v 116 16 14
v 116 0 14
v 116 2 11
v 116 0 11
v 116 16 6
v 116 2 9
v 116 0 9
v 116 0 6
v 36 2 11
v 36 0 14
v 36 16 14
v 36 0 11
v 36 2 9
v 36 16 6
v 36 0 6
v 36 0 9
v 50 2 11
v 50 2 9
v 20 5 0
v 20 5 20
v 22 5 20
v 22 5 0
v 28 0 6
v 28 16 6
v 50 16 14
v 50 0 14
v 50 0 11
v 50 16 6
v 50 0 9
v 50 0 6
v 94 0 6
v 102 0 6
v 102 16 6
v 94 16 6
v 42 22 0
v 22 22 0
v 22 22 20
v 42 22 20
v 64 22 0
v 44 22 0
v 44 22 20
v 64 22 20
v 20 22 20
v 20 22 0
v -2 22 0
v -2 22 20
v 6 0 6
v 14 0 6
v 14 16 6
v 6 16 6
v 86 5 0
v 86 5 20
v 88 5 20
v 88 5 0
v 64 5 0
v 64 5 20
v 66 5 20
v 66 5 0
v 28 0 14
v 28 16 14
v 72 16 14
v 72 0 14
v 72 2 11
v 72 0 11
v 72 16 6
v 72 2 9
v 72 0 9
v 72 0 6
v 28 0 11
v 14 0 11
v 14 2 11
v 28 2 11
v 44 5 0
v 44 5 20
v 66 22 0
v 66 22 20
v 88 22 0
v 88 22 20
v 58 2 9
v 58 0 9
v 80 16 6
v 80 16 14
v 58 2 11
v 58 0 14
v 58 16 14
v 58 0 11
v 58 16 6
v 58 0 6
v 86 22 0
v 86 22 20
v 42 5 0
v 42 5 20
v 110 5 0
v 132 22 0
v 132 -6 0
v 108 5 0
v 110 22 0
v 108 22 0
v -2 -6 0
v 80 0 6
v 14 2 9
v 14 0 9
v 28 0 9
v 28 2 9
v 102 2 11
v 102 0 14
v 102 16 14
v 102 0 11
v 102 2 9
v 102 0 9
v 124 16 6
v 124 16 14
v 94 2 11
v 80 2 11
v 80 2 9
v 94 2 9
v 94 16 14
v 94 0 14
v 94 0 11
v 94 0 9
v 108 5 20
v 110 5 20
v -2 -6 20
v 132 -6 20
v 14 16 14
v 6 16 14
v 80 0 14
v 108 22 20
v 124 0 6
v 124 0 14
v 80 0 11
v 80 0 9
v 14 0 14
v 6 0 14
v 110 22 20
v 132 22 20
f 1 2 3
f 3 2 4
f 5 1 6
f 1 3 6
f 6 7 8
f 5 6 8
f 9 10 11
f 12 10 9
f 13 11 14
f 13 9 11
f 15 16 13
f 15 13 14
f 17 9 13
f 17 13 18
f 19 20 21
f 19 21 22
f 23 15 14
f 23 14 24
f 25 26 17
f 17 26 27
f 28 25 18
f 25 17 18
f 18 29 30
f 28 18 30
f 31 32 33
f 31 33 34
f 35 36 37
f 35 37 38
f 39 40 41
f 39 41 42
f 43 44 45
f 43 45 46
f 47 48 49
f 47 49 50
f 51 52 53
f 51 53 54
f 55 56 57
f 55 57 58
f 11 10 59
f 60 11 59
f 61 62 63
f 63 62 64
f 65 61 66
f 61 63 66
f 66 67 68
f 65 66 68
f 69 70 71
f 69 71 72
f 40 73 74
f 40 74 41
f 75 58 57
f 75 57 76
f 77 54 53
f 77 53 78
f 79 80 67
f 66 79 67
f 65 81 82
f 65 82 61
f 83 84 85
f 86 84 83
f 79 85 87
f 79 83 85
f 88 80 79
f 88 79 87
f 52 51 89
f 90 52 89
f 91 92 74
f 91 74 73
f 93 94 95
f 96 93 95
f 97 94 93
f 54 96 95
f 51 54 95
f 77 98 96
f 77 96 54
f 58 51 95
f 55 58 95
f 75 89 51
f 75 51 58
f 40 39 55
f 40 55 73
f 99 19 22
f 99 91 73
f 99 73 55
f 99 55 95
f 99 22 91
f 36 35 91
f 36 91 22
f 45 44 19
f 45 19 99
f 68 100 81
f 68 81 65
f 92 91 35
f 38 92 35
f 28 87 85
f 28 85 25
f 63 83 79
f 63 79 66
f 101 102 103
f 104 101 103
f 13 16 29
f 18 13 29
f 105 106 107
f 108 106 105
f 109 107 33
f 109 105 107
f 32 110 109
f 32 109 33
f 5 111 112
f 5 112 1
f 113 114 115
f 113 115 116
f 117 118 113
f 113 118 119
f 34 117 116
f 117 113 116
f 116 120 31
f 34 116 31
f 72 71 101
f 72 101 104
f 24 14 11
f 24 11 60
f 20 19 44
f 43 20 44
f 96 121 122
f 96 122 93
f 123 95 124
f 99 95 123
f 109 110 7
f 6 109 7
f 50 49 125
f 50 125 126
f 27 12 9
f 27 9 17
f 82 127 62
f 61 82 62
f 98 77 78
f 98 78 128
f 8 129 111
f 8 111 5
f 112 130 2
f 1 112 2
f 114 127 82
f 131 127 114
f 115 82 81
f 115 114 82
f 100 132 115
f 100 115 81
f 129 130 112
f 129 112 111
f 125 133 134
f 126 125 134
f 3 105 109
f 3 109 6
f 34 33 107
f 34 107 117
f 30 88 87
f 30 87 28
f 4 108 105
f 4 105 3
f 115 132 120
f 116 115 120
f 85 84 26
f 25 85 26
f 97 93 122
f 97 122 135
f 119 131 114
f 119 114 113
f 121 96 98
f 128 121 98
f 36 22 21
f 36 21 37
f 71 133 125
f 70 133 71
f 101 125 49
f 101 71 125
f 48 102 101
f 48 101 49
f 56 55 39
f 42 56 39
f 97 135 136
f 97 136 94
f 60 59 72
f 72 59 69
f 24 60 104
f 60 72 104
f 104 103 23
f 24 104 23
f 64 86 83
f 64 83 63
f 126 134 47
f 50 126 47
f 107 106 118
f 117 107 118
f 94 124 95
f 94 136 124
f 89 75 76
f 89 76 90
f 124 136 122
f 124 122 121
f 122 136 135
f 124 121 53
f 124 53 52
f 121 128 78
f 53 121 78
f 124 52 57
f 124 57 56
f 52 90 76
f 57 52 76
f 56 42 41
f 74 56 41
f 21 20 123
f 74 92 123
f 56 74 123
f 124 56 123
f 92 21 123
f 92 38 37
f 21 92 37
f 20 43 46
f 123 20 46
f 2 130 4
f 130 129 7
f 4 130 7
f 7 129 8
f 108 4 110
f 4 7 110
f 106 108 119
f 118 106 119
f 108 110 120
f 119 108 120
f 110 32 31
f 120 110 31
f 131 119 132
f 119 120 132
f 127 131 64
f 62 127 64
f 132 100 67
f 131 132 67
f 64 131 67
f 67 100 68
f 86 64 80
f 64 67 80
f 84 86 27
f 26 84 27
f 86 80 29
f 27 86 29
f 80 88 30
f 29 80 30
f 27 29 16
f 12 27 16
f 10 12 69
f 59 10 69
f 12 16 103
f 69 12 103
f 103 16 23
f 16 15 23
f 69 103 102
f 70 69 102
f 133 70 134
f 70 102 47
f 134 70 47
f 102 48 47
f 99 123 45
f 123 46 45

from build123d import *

# Parameters (mm, degrees)
SKETCH1_W           = 20
SKETCH1_H           = 22
BOSS_EXTRUDE1_DEPTH = 20
SKETCH2_W           = 8
SKETCH2_H           = 8
CUT_EXTRUDE1_DEPTH  = 16
SKETCH3_W           = 20
SKETCH3_H           = 5
BOSS_EXTRUDE2_DEPTH = 2
LPATTERN1_COUNT     = 6
LPATTERN1_PITCH     = 22
SKETCH4_W           = 20
SKETCH4_H           = 17
BOSS_EXTRUDE3_DEPTH = 2
SKETCH5_W           = 20
SKETCH5_H           = 22
BOSS_EXTRUDE4_DEPTH = 2
SKETCH6_W           = 118
SKETCH6_H           = 2
CUT_EXTRUDE2_DEPTH  = 2
SKETCH7_W           = 134
SKETCH7_H           = 20
BOSS_EXTRUDE5_DEPTH = 6


with BuildPart() as part:
    # Sketch1 → Boss-Extrude1 (new body)
    with BuildSketch(Plane.XY):
        with Locations((10, 11)):
            Rectangle(SKETCH1_W, SKETCH1_H)
    extrude(amount=BOSS_EXTRUDE1_DEPTH)

    # Sketch2 → Cut-Extrude1 (cut)
    with BuildSketch(Plane(origin=(0, 0, 0), x_dir=(-1, 0, 0), z_dir=(0, -1, 0))):
        with Locations((-10, -10)):
            Rectangle(SKETCH2_W, SKETCH2_H)
    extrude(amount=-CUT_EXTRUDE1_DEPTH, mode=Mode.SUBTRACT)

    # Sketch3 → Boss-Extrude2 (add)
    with BuildSketch(Plane(origin=(20, 0, 0), x_dir=(0, 0, -1), z_dir=(1, 0, 0))):
        with Locations((-10, 2.5)):
            Rectangle(SKETCH3_W, SKETCH3_H)
    extrude(amount=BOSS_EXTRUDE2_DEPTH)


with BuildPart() as lpattern1_1:
    # LPattern1: pattern copy
    add(part.part.moved(Location(Vector(1, 0, 0) * (1 * LPATTERN1_PITCH))))


with BuildPart() as lpattern1_2:
    # LPattern1: pattern copy
    add(part.part.moved(Location(Vector(1, 0, 0) * (2 * LPATTERN1_PITCH))))


with BuildPart() as lpattern1_3:
    # LPattern1: pattern copy
    add(part.part.moved(Location(Vector(1, 0, 0) * (3 * LPATTERN1_PITCH))))


with BuildPart() as lpattern1_4:
    # LPattern1: pattern copy
    add(part.part.moved(Location(Vector(1, 0, 0) * (4 * LPATTERN1_PITCH))))


with BuildPart() as lpattern1_5:
    # LPattern1: pattern copy
    add(part.part.moved(Location(Vector(1, 0, 0) * (5 * LPATTERN1_PITCH))))


with BuildPart() as lpattern1_1_1:
    add(lpattern1_1.part)

    # Combine1: union LPattern1_2, LPattern1_3, LPattern1_4, LPattern1_5, part
    add(lpattern1_2.part)
    add(lpattern1_3.part)
    add(lpattern1_4.part)
    add(lpattern1_5.part)
    add(part.part)

    # Sketch4 → Boss-Extrude3 (add)
    with BuildSketch(Plane(origin=(130, 0, 0), x_dir=(0, 0, -1), z_dir=(1, 0, 0))):
        with Locations((-10, 13.5)):
            Rectangle(SKETCH4_W, SKETCH4_H)
    extrude(amount=BOSS_EXTRUDE3_DEPTH)

    # Sketch5 → Boss-Extrude4 (add)
    with BuildSketch(Plane.ZY):
        with Locations((10, 11)):
            Rectangle(SKETCH5_W, SKETCH5_H)
    extrude(amount=BOSS_EXTRUDE4_DEPTH)

    # Sketch6 → Cut-Extrude2 (cut)
    with BuildSketch(Plane.XZ):
        with Locations((65, 10)):
            Rectangle(SKETCH6_W, SKETCH6_H)
    extrude(amount=-CUT_EXTRUDE2_DEPTH, mode=Mode.SUBTRACT)

    # Sketch7 → Boss-Extrude5 (add)
    with BuildSketch(Plane(origin=(0, 0, 0), x_dir=(-1, 0, 0), z_dir=(0, -1, 0))):
        with Locations((-65, -10)):
            Rectangle(SKETCH7_W, SKETCH7_H)
    extrude(amount=BOSS_EXTRUDE5_DEPTH)


solid = lpattern1_1_1.part
